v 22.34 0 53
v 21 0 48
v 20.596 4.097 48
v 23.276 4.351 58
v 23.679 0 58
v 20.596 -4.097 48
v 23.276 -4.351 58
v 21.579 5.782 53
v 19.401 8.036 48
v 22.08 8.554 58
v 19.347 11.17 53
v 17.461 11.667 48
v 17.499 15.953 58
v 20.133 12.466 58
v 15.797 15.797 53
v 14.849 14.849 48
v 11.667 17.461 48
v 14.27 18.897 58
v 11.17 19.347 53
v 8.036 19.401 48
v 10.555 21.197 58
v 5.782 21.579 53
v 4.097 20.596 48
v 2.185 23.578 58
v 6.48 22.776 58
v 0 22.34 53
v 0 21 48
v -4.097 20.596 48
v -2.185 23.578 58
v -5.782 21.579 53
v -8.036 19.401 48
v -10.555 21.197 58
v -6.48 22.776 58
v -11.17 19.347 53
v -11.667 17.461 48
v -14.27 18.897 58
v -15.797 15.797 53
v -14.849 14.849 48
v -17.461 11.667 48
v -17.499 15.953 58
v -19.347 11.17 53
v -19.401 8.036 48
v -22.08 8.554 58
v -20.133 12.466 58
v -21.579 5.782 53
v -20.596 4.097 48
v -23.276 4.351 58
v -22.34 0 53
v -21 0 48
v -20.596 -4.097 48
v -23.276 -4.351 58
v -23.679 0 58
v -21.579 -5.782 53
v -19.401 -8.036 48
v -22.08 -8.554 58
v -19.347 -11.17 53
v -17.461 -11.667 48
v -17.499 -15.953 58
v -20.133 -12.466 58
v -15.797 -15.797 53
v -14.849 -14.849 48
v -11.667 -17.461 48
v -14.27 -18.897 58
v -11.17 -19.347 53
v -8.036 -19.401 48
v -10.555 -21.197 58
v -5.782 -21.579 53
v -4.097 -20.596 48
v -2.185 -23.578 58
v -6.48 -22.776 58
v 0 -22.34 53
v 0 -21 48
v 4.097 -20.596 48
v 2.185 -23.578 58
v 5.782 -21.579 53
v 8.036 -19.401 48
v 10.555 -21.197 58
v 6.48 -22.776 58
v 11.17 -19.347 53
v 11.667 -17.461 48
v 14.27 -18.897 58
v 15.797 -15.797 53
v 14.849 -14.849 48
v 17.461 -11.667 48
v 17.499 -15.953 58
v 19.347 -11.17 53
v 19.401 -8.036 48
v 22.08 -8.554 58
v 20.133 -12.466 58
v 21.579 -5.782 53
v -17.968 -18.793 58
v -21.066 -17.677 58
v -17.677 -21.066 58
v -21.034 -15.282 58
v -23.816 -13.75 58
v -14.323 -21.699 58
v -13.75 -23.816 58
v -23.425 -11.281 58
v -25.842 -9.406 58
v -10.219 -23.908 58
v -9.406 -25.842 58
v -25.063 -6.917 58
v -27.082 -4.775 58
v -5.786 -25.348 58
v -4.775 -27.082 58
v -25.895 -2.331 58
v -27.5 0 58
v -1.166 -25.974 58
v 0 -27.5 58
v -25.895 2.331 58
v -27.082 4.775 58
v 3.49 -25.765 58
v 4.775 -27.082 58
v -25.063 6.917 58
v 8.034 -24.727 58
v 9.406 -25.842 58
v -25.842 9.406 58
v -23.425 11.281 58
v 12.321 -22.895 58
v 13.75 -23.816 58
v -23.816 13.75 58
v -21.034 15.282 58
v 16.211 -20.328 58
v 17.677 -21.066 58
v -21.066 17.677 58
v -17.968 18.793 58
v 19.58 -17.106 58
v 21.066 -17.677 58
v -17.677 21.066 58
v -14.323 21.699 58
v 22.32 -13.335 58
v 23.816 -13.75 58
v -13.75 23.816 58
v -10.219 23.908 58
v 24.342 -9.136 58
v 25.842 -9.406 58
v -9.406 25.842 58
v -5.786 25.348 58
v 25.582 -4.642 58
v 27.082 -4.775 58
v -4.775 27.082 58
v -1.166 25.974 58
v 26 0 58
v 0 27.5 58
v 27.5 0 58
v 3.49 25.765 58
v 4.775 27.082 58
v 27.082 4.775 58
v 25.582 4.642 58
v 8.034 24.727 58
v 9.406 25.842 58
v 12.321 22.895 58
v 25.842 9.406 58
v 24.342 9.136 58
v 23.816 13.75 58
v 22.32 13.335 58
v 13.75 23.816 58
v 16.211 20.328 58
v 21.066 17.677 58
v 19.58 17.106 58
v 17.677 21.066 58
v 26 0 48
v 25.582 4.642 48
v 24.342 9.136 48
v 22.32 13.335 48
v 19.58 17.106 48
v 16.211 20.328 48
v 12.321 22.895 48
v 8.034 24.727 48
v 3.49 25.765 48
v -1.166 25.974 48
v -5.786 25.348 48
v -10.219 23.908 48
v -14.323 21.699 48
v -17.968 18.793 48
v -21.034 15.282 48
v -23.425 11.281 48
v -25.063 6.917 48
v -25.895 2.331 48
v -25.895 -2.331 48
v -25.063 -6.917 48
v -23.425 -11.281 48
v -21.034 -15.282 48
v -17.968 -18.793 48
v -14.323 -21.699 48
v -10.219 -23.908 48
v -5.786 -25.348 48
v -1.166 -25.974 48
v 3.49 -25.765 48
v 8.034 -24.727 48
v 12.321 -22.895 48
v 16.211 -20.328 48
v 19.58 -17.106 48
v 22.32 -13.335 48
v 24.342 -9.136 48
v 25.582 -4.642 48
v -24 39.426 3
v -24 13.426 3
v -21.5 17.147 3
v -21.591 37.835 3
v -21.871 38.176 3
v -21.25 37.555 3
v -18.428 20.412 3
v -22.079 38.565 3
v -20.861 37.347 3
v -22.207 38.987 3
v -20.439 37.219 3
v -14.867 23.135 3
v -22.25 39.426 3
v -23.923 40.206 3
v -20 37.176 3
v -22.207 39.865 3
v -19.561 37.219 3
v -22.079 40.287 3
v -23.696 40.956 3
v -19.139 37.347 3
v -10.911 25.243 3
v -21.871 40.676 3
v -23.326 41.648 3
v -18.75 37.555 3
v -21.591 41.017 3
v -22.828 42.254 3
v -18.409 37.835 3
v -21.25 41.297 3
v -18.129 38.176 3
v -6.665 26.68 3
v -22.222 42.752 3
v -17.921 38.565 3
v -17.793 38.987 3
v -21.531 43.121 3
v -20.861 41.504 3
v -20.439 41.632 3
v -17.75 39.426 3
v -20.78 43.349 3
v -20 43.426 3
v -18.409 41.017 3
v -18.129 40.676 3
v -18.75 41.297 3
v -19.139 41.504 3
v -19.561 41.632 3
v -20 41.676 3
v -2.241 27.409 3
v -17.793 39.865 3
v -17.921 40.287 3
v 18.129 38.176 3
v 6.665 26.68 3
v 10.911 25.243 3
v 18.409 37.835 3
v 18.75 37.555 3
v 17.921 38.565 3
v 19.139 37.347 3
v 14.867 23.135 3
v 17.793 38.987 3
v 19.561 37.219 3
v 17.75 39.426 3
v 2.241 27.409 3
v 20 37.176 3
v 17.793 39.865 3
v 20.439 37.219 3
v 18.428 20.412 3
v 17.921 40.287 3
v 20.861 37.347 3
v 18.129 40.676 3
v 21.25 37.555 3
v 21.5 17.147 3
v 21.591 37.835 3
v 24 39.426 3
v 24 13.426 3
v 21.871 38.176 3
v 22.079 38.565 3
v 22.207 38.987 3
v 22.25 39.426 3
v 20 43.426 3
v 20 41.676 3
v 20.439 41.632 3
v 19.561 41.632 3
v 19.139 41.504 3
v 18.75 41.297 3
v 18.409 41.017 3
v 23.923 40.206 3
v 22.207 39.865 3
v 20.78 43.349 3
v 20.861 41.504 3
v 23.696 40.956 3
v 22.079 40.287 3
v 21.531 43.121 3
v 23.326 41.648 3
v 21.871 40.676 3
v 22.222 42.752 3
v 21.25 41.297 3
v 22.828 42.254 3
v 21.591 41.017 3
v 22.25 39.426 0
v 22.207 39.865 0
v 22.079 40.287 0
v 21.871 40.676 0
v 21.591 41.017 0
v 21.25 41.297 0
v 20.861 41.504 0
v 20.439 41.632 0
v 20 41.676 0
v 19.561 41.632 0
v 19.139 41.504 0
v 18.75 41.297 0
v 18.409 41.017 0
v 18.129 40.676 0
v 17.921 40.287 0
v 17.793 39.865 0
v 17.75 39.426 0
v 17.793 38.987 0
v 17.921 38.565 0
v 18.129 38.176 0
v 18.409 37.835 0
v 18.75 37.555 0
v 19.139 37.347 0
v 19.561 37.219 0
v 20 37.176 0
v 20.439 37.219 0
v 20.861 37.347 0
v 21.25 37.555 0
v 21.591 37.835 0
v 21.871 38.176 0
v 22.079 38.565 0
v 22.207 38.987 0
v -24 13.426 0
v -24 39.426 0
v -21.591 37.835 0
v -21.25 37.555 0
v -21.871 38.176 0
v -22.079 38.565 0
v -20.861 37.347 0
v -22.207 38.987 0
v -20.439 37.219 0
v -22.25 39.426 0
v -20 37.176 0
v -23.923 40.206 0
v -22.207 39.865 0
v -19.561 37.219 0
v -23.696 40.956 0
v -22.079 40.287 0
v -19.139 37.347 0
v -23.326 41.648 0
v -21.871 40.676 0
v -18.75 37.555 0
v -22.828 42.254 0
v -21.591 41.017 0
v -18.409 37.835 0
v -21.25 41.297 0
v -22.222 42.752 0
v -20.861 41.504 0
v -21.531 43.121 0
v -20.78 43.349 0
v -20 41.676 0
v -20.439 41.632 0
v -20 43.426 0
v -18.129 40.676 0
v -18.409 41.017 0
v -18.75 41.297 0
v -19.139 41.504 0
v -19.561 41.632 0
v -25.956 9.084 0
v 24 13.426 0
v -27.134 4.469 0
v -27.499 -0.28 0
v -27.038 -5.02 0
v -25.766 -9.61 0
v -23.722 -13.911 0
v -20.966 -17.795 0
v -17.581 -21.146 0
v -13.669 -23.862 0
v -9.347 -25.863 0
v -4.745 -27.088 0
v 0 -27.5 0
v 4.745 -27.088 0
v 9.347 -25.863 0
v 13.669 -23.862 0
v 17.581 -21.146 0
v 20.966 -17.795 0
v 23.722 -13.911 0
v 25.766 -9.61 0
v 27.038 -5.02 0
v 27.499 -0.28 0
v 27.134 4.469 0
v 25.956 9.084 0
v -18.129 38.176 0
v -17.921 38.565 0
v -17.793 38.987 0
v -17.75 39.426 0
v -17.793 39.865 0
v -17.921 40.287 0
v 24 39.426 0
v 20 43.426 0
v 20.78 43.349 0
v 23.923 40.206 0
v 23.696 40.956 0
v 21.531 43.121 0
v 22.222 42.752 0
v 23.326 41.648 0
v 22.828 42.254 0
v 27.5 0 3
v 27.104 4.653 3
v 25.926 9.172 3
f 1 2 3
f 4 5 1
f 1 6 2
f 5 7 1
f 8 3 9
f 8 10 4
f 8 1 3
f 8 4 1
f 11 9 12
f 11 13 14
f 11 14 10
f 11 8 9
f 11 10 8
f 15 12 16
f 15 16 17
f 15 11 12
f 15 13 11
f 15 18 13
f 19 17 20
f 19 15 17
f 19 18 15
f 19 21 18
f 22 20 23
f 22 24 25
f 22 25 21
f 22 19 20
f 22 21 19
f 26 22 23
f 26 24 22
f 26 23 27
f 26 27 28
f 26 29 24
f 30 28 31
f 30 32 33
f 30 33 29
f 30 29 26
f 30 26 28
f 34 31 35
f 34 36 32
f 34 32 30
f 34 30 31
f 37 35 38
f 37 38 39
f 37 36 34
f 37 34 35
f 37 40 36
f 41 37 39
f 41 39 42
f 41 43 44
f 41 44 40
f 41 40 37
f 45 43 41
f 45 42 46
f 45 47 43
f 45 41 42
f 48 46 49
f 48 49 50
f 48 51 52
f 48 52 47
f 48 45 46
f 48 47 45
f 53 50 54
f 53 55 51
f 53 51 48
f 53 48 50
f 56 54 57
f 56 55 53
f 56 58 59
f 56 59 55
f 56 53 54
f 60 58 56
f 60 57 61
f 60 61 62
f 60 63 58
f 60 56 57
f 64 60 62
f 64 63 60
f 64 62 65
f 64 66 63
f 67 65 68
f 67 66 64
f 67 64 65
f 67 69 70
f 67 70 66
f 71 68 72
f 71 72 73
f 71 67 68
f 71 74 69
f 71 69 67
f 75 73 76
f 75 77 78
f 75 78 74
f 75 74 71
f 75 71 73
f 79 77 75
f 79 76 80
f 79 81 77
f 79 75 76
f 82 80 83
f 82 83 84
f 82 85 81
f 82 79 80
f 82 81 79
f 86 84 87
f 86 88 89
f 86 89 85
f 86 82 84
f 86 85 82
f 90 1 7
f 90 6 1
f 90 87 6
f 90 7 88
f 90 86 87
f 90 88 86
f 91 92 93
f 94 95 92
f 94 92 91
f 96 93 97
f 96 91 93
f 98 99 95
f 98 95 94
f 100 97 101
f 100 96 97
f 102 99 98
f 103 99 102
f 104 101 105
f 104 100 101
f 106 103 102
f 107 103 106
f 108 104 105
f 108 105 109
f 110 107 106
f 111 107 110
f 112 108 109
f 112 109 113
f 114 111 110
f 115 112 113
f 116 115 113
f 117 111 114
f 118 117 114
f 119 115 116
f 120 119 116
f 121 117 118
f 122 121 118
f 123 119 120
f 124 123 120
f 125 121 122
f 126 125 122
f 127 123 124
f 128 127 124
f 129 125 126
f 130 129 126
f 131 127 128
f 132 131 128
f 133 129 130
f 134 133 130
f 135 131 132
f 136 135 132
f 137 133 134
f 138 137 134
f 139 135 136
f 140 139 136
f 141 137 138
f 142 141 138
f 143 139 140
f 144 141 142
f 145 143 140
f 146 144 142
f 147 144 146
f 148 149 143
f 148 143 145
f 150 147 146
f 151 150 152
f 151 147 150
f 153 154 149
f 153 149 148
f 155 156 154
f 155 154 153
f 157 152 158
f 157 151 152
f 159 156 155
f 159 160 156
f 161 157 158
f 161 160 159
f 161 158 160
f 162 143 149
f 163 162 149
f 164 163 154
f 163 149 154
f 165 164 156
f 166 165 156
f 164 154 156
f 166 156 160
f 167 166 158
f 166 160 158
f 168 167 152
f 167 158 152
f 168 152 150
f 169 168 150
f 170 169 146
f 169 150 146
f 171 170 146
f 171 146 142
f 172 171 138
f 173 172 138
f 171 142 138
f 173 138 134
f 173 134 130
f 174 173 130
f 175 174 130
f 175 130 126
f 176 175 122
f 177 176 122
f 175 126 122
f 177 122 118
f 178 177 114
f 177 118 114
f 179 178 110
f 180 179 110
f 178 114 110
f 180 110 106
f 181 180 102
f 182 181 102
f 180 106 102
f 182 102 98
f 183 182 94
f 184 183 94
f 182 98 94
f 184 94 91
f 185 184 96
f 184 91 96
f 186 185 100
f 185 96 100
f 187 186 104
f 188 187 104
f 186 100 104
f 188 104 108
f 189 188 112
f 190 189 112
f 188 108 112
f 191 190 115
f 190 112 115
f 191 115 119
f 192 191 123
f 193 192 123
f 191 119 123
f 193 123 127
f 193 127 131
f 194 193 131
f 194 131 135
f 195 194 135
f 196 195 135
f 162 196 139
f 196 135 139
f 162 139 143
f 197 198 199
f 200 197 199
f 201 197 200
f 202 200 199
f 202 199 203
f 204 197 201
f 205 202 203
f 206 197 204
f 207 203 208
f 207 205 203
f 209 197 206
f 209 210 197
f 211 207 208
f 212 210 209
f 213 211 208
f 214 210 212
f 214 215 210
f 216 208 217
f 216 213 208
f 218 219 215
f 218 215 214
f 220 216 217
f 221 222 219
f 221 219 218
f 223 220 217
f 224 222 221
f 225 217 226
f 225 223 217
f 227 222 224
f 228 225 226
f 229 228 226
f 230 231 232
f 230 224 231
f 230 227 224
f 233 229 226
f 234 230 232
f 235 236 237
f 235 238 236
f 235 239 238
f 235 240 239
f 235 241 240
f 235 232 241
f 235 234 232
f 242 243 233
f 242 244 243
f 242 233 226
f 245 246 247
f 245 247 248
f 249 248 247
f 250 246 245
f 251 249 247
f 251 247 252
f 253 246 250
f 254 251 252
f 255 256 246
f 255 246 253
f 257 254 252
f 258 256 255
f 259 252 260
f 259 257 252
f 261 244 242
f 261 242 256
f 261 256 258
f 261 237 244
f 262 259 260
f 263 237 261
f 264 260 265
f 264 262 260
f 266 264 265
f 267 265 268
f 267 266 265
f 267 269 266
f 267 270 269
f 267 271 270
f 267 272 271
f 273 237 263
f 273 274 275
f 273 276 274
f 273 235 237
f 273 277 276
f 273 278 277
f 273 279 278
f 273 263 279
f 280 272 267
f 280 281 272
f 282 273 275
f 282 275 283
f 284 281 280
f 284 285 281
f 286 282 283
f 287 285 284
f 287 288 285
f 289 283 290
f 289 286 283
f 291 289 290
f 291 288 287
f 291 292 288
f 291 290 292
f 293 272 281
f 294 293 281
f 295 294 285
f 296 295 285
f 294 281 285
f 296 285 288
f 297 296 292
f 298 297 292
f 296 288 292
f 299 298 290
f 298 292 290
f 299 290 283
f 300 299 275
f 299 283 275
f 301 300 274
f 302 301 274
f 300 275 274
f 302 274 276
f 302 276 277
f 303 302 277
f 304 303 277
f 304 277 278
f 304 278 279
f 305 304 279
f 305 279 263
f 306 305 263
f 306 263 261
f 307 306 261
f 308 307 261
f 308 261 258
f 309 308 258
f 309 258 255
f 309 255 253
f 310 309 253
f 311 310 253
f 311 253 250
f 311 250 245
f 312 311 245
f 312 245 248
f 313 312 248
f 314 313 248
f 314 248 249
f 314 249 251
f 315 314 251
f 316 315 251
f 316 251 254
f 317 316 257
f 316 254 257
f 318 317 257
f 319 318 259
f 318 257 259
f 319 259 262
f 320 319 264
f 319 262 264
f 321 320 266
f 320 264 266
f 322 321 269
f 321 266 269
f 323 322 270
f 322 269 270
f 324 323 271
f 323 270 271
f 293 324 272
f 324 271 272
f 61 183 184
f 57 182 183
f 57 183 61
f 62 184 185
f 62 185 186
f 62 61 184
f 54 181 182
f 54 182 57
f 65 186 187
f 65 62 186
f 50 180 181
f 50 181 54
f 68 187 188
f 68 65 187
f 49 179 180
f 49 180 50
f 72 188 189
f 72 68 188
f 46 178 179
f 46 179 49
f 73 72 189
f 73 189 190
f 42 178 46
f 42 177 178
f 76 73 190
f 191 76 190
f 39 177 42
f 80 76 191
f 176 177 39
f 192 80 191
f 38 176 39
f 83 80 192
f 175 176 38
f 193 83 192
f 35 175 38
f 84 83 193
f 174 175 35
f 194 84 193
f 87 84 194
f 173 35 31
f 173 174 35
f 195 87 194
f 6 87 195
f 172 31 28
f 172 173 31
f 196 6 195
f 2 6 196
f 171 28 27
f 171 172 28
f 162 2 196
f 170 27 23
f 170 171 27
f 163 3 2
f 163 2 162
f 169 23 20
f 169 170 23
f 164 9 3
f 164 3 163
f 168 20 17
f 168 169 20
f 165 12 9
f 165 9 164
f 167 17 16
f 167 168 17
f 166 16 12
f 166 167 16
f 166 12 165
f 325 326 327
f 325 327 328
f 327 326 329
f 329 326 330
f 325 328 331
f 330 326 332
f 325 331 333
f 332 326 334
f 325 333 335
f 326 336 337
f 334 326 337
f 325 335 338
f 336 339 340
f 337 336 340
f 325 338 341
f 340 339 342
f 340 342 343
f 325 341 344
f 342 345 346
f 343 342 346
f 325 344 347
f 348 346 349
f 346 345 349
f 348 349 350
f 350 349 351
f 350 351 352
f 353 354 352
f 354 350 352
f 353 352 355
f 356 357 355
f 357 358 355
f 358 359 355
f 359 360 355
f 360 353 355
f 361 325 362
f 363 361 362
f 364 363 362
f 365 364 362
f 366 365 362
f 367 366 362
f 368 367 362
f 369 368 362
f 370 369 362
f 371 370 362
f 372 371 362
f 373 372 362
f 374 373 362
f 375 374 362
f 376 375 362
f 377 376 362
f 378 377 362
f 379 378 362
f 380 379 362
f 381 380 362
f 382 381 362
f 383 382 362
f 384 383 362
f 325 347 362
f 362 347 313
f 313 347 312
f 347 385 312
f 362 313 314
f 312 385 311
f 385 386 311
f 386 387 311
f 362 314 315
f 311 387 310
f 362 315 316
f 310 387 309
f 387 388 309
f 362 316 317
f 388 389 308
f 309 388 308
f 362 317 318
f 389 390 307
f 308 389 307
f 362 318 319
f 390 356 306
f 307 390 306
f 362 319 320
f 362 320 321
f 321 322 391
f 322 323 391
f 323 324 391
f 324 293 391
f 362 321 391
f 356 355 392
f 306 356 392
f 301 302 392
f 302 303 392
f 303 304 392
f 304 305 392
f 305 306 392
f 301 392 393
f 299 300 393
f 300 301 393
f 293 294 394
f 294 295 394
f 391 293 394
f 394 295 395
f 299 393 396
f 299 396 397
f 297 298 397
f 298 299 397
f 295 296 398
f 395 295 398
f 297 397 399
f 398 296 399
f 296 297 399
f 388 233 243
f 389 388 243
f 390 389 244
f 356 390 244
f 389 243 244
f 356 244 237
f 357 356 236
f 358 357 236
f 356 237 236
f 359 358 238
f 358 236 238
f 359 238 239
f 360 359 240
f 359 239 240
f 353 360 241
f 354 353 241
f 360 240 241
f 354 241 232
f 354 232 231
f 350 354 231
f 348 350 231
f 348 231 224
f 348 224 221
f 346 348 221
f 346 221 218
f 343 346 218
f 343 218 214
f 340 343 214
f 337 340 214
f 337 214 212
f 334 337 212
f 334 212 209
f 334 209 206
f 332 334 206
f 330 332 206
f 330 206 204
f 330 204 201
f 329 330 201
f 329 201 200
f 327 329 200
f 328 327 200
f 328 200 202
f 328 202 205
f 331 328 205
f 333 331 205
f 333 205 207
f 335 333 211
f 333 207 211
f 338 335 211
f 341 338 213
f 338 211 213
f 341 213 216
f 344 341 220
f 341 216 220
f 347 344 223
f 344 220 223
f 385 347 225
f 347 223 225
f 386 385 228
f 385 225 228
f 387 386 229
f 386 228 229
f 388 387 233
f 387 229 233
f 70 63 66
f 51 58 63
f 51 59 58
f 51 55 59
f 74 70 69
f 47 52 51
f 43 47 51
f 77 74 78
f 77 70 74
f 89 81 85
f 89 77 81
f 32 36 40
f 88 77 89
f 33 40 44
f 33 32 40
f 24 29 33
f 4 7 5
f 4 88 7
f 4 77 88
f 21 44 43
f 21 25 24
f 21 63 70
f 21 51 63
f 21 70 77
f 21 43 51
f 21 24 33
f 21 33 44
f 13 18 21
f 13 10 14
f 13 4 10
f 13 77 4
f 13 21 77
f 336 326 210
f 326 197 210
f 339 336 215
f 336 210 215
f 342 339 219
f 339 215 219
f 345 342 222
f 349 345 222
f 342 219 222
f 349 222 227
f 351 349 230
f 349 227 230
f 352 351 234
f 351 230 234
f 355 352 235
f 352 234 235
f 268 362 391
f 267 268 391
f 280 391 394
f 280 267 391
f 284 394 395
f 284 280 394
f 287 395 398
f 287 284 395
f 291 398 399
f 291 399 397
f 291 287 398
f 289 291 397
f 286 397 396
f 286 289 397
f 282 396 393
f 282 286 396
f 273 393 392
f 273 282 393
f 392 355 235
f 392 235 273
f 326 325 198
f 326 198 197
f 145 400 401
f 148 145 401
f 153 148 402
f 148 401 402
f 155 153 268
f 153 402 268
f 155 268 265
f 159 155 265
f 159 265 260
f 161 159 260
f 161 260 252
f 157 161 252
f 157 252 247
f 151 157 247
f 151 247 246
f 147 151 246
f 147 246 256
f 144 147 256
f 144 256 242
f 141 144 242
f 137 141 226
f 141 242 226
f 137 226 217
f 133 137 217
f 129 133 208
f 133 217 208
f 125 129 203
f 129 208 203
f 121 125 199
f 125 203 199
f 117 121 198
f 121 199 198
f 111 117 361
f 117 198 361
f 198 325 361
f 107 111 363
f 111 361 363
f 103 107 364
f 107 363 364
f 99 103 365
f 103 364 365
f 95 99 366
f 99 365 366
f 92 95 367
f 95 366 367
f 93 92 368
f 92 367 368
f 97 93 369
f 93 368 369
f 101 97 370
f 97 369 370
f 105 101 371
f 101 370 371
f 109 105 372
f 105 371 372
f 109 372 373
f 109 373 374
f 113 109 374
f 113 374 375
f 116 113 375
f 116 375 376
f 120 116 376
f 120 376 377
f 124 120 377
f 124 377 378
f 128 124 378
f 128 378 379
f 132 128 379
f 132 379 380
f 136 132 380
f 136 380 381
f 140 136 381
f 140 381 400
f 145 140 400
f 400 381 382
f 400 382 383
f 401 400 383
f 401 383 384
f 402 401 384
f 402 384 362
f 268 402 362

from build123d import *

# Parameters (mm, degrees)
SZKIC1_R                    = 27.5
SZKIC1_W                    = 48
SZKIC1_H                    = 30
DODANIE_WYCI_GNI_CIE1_DEPTH = 3
SZKIC2_R                    = 27.5
DODANIE_WYCI_GNI_CIE2_DEPTH = 55
SZKIC3_R                    = 26
WYTNIJ_WYCI_GNI_CIE1_DEPTH  = 10
SZKIC4_R                    = 21
DODANIE_WYCI_GNI_CIE3_DEPTH = 10
DODANIE_WYCI_GNI_CIE3_TAPER = -15
WYTNIJ_WYCI_GNI_CIE2_REACH  = 5
SZKIC5_R                    = 2.25
ZAOKR_GLENIE1_R             = 4


with BuildPart() as part:
    # Szkic1 → Dodanie-wyciągnięcie1 (new body)
    with BuildSketch(Plane.XY):
        Circle(SZKIC1_R)
        with Locations((0, 28.425721582)):
            Rectangle(SZKIC1_W, SZKIC1_H)
    extrude(amount=DODANIE_WYCI_GNI_CIE1_DEPTH)

    # Szkic2 → Dodanie-wyciągnięcie2 (add)
    with BuildSketch(Plane.XY.offset(3)):
        Circle(SZKIC2_R)
    extrude(amount=DODANIE_WYCI_GNI_CIE2_DEPTH)

    # Szkic3 → Wytnij-wyciągnięcie1 (cut)
    with BuildSketch(Plane.XY.offset(58)):
        Circle(SZKIC3_R)
    extrude(amount=-WYTNIJ_WYCI_GNI_CIE1_DEPTH, mode=Mode.SUBTRACT)

    # Szkic4 → Dodanie-wyciągnięcie3 (add)
    with BuildSketch(Plane.XY.offset(48)):
        Circle(SZKIC4_R)
    extrude(amount=DODANIE_WYCI_GNI_CIE3_DEPTH, taper=DODANIE_WYCI_GNI_CIE3_TAPER)

    # Szkic5 → Wytnij-wyciągnięcie2 (cut, up to next)
    with BuildSketch(Plane.XY.offset(3), mode=Mode.PRIVATE) as wytnij_wyci_gni_cie2_sk1:
        with Locations((-20, 39.425721582)):
            Circle(SZKIC5_R)
    wytnij_wyci_gni_cie2_tool1 = extrude(wytnij_wyci_gni_cie2_sk1.sketch, amount=-WYTNIJ_WYCI_GNI_CIE2_REACH, mode=Mode.PRIVATE) & part.part
    add(wytnij_wyci_gni_cie2_tool1.solids().sort_by_distance((-20, 39.425722, 3))[0], mode=Mode.SUBTRACT)
    # Szkic5 → Wytnij-wyciągnięcie2 (cut, up to next)
    with BuildSketch(Plane.XY.offset(3), mode=Mode.PRIVATE) as wytnij_wyci_gni_cie2_sk2:
        with Locations((20, 39.425721582)):
            Circle(SZKIC5_R)
    wytnij_wyci_gni_cie2_tool2 = extrude(wytnij_wyci_gni_cie2_sk2.sketch, amount=-WYTNIJ_WYCI_GNI_CIE2_REACH, mode=Mode.PRIVATE) & part.part
    add(wytnij_wyci_gni_cie2_tool2.solids().sort_by_distance((20, 39.425722, 3))[0], mode=Mode.SUBTRACT)

    # Zaokrąglenie1
    zaokr_glenie1_edges = [part.edges().sort_by_distance(p)[0] for p in [
        (24, 43.425721582, 1.5),
        (-24, 43.425721582, 1.5),
    ]]
    fillet(zaokr_glenie1_edges, radius=ZAOKR_GLENIE1_R)


solid = part.part
